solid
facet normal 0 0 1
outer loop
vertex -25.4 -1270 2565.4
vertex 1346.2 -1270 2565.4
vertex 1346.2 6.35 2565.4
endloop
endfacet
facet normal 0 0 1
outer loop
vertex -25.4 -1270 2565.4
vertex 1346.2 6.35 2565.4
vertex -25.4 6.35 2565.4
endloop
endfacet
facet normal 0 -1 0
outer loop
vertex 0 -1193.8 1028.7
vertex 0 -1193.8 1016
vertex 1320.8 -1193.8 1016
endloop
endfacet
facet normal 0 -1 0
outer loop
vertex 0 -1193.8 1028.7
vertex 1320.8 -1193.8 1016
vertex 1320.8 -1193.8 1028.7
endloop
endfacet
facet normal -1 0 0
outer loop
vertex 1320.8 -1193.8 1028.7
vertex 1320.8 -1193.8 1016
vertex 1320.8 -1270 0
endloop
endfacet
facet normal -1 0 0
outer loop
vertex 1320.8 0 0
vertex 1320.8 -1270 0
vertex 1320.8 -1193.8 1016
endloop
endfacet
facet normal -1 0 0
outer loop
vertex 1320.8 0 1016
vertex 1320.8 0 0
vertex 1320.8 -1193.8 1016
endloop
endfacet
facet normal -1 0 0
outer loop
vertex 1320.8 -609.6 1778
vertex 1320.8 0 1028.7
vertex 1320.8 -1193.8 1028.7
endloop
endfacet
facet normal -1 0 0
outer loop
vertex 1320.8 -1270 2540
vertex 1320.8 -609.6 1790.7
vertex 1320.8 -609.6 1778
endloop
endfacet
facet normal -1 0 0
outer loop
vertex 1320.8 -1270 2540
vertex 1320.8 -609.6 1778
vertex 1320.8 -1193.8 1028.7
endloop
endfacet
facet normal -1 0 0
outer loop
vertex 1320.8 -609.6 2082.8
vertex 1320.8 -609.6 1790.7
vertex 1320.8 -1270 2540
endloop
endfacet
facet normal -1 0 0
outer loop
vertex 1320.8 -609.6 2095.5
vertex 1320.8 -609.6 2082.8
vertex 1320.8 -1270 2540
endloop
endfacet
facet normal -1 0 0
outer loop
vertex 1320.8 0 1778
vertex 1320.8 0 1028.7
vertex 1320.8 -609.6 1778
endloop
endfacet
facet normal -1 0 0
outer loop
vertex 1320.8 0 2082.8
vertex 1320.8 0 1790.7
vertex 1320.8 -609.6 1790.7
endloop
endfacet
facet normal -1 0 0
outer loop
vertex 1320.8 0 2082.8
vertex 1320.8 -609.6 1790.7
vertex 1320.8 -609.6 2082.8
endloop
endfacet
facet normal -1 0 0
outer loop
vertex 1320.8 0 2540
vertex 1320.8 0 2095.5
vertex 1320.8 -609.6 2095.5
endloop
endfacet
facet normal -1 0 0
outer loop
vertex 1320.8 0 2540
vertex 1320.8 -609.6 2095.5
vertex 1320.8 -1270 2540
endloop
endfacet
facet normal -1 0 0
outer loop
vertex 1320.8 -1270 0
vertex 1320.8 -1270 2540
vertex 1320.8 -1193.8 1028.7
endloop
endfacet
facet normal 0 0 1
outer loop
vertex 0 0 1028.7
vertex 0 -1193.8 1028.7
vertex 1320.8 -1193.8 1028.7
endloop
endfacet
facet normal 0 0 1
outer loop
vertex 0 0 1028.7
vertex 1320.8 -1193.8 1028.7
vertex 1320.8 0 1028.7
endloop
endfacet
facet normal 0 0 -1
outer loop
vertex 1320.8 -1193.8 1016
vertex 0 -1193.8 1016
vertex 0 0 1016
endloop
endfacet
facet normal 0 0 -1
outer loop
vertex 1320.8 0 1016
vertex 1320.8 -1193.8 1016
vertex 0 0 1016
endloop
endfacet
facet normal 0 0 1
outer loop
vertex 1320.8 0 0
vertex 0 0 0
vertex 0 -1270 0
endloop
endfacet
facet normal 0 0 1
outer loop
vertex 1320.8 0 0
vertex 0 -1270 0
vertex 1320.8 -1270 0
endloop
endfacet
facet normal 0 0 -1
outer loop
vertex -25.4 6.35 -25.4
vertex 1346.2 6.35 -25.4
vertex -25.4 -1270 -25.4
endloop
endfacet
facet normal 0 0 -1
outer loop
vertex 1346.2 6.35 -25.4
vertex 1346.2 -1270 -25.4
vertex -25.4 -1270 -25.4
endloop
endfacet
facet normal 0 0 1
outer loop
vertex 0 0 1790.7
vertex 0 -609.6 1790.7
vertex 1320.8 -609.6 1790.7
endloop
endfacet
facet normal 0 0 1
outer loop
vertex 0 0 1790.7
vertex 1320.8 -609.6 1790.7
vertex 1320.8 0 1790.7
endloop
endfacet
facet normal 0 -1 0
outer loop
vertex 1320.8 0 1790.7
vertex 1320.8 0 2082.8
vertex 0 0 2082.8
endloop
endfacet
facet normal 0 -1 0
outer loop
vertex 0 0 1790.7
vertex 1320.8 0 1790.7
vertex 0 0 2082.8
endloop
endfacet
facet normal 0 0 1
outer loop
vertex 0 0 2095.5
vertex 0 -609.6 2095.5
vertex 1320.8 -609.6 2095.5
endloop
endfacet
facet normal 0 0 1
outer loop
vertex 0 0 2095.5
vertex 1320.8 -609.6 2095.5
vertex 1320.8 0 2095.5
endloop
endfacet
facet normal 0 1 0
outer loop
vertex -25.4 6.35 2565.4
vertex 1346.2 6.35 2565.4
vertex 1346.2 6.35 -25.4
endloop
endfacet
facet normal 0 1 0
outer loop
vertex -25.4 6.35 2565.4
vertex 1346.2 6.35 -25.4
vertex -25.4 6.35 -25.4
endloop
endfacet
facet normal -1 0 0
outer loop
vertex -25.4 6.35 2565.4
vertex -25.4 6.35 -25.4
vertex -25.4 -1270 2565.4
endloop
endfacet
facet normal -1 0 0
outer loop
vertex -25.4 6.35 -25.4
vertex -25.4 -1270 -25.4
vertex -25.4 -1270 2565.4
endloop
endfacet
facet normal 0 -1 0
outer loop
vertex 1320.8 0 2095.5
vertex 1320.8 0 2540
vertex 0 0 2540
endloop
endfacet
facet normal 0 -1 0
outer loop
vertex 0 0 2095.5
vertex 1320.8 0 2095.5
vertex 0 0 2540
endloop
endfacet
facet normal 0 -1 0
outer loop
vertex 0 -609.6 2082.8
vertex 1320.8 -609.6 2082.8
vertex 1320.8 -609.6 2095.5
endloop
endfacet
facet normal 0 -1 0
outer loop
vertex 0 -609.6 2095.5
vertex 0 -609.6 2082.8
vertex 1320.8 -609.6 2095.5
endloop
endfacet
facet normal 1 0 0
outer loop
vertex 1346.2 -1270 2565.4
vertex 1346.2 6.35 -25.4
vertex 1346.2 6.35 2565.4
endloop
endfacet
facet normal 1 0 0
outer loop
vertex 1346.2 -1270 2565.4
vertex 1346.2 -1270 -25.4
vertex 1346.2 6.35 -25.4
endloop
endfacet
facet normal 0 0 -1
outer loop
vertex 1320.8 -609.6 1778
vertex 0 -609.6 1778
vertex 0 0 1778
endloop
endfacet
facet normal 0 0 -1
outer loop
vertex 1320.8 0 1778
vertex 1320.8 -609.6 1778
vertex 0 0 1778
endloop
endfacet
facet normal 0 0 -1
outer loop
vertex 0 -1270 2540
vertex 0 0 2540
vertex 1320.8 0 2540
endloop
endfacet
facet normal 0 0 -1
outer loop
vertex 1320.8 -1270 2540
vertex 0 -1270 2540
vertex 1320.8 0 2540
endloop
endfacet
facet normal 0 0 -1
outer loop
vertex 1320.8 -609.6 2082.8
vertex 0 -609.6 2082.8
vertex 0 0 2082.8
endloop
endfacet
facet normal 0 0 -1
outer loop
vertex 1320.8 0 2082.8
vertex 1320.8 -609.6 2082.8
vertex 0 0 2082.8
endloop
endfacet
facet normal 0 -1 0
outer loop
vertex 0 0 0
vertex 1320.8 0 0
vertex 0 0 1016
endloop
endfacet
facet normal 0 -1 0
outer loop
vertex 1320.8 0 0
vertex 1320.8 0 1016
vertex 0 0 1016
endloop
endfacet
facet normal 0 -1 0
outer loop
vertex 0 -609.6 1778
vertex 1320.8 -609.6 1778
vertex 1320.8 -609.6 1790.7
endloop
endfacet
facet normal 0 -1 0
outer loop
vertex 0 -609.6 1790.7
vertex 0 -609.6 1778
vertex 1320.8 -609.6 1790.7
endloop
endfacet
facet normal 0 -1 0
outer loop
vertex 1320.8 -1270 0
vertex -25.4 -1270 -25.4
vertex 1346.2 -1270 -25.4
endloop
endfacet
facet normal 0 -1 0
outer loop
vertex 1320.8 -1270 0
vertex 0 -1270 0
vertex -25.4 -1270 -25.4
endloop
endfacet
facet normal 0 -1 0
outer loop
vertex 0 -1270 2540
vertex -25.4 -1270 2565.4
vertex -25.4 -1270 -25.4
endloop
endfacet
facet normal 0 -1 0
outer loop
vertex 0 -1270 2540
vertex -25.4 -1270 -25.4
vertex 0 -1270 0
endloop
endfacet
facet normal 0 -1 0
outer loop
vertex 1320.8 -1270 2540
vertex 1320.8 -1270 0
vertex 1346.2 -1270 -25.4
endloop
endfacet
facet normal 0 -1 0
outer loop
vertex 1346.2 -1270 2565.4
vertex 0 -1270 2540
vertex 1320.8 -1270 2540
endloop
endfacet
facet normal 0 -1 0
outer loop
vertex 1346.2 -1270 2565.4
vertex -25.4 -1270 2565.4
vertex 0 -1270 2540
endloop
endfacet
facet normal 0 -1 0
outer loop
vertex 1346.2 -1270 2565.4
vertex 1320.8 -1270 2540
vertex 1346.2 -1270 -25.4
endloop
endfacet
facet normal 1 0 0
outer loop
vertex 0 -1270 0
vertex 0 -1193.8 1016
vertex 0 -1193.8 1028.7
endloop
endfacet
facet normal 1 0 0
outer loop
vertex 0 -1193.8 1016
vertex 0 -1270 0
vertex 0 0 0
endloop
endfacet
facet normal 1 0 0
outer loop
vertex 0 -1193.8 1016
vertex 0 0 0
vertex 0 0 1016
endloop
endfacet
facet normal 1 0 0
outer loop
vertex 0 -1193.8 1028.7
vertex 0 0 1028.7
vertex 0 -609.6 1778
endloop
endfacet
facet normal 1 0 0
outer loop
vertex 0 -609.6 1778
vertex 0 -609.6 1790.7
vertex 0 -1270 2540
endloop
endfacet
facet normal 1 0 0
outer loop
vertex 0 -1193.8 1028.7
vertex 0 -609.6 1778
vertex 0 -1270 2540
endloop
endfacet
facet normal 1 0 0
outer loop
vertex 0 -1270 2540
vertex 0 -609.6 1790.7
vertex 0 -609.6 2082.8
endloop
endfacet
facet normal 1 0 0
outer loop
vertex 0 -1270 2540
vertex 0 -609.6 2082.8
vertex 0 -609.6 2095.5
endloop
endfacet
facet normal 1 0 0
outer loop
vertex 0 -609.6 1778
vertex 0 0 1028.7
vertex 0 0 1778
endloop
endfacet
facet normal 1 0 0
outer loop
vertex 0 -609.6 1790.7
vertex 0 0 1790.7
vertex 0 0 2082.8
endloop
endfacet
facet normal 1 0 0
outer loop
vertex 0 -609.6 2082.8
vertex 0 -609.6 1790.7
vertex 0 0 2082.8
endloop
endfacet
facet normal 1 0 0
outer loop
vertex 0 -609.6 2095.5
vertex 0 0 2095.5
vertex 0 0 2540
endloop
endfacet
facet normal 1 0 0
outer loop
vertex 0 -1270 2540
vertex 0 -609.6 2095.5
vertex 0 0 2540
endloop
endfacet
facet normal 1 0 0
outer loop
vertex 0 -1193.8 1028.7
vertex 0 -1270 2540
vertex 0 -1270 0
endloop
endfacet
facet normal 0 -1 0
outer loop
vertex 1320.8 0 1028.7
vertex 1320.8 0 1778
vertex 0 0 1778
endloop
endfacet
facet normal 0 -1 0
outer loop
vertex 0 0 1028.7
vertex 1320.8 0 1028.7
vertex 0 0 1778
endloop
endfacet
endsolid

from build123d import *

# Parameters (mm, degrees)
F0_W     = 1371.6
F0_H     = 2590.8
F0_W_2   = 1320.8
F0_H_2   = 2540
F1_DEPTH = 1270
F2_W     = 1193.8
F2_H     = 12.7
F2_W_2   = 609.6
F3_DEPTH = 1320.8
F4_W     = 1371.6
F4_H     = 2590.8
F5_DEPTH = 6.35


with BuildPart() as f1:
    # F0 (on Front) → F1 (new body)
    with BuildSketch(Plane.XZ):
        with Locations((660.4, 1270)):
            Rectangle(F0_W, F0_H)
        with Locations((660.4, 1270)):
            Rectangle(F0_W_2, F0_H_2, mode=Mode.SUBTRACT)
    extrude(amount=F1_DEPTH)

    # F2 (on face) → F3 (join, through all)
    with BuildSketch(Plane.YZ):
        with Locations((-596.9, 1022.35)):
            Rectangle(F2_W, F2_H)
        with Locations((-304.8, 2089.15)):
            Rectangle(F2_W_2, F2_H)
        with Locations((-304.8, 1784.35)):
            Rectangle(F2_W_2, F2_H)
    extrude(amount=F3_DEPTH)

    # F4 (on face) → F5 (join)
    with BuildSketch(Plane(origin=(0, 0, 0), x_dir=(-1, 0, 0), z_dir=(0, 1, 0))):
        with Locations((-660.4, 1270)):
            Rectangle(F4_W, F4_H)
    extrude(amount=F5_DEPTH)


solid = f1.part
